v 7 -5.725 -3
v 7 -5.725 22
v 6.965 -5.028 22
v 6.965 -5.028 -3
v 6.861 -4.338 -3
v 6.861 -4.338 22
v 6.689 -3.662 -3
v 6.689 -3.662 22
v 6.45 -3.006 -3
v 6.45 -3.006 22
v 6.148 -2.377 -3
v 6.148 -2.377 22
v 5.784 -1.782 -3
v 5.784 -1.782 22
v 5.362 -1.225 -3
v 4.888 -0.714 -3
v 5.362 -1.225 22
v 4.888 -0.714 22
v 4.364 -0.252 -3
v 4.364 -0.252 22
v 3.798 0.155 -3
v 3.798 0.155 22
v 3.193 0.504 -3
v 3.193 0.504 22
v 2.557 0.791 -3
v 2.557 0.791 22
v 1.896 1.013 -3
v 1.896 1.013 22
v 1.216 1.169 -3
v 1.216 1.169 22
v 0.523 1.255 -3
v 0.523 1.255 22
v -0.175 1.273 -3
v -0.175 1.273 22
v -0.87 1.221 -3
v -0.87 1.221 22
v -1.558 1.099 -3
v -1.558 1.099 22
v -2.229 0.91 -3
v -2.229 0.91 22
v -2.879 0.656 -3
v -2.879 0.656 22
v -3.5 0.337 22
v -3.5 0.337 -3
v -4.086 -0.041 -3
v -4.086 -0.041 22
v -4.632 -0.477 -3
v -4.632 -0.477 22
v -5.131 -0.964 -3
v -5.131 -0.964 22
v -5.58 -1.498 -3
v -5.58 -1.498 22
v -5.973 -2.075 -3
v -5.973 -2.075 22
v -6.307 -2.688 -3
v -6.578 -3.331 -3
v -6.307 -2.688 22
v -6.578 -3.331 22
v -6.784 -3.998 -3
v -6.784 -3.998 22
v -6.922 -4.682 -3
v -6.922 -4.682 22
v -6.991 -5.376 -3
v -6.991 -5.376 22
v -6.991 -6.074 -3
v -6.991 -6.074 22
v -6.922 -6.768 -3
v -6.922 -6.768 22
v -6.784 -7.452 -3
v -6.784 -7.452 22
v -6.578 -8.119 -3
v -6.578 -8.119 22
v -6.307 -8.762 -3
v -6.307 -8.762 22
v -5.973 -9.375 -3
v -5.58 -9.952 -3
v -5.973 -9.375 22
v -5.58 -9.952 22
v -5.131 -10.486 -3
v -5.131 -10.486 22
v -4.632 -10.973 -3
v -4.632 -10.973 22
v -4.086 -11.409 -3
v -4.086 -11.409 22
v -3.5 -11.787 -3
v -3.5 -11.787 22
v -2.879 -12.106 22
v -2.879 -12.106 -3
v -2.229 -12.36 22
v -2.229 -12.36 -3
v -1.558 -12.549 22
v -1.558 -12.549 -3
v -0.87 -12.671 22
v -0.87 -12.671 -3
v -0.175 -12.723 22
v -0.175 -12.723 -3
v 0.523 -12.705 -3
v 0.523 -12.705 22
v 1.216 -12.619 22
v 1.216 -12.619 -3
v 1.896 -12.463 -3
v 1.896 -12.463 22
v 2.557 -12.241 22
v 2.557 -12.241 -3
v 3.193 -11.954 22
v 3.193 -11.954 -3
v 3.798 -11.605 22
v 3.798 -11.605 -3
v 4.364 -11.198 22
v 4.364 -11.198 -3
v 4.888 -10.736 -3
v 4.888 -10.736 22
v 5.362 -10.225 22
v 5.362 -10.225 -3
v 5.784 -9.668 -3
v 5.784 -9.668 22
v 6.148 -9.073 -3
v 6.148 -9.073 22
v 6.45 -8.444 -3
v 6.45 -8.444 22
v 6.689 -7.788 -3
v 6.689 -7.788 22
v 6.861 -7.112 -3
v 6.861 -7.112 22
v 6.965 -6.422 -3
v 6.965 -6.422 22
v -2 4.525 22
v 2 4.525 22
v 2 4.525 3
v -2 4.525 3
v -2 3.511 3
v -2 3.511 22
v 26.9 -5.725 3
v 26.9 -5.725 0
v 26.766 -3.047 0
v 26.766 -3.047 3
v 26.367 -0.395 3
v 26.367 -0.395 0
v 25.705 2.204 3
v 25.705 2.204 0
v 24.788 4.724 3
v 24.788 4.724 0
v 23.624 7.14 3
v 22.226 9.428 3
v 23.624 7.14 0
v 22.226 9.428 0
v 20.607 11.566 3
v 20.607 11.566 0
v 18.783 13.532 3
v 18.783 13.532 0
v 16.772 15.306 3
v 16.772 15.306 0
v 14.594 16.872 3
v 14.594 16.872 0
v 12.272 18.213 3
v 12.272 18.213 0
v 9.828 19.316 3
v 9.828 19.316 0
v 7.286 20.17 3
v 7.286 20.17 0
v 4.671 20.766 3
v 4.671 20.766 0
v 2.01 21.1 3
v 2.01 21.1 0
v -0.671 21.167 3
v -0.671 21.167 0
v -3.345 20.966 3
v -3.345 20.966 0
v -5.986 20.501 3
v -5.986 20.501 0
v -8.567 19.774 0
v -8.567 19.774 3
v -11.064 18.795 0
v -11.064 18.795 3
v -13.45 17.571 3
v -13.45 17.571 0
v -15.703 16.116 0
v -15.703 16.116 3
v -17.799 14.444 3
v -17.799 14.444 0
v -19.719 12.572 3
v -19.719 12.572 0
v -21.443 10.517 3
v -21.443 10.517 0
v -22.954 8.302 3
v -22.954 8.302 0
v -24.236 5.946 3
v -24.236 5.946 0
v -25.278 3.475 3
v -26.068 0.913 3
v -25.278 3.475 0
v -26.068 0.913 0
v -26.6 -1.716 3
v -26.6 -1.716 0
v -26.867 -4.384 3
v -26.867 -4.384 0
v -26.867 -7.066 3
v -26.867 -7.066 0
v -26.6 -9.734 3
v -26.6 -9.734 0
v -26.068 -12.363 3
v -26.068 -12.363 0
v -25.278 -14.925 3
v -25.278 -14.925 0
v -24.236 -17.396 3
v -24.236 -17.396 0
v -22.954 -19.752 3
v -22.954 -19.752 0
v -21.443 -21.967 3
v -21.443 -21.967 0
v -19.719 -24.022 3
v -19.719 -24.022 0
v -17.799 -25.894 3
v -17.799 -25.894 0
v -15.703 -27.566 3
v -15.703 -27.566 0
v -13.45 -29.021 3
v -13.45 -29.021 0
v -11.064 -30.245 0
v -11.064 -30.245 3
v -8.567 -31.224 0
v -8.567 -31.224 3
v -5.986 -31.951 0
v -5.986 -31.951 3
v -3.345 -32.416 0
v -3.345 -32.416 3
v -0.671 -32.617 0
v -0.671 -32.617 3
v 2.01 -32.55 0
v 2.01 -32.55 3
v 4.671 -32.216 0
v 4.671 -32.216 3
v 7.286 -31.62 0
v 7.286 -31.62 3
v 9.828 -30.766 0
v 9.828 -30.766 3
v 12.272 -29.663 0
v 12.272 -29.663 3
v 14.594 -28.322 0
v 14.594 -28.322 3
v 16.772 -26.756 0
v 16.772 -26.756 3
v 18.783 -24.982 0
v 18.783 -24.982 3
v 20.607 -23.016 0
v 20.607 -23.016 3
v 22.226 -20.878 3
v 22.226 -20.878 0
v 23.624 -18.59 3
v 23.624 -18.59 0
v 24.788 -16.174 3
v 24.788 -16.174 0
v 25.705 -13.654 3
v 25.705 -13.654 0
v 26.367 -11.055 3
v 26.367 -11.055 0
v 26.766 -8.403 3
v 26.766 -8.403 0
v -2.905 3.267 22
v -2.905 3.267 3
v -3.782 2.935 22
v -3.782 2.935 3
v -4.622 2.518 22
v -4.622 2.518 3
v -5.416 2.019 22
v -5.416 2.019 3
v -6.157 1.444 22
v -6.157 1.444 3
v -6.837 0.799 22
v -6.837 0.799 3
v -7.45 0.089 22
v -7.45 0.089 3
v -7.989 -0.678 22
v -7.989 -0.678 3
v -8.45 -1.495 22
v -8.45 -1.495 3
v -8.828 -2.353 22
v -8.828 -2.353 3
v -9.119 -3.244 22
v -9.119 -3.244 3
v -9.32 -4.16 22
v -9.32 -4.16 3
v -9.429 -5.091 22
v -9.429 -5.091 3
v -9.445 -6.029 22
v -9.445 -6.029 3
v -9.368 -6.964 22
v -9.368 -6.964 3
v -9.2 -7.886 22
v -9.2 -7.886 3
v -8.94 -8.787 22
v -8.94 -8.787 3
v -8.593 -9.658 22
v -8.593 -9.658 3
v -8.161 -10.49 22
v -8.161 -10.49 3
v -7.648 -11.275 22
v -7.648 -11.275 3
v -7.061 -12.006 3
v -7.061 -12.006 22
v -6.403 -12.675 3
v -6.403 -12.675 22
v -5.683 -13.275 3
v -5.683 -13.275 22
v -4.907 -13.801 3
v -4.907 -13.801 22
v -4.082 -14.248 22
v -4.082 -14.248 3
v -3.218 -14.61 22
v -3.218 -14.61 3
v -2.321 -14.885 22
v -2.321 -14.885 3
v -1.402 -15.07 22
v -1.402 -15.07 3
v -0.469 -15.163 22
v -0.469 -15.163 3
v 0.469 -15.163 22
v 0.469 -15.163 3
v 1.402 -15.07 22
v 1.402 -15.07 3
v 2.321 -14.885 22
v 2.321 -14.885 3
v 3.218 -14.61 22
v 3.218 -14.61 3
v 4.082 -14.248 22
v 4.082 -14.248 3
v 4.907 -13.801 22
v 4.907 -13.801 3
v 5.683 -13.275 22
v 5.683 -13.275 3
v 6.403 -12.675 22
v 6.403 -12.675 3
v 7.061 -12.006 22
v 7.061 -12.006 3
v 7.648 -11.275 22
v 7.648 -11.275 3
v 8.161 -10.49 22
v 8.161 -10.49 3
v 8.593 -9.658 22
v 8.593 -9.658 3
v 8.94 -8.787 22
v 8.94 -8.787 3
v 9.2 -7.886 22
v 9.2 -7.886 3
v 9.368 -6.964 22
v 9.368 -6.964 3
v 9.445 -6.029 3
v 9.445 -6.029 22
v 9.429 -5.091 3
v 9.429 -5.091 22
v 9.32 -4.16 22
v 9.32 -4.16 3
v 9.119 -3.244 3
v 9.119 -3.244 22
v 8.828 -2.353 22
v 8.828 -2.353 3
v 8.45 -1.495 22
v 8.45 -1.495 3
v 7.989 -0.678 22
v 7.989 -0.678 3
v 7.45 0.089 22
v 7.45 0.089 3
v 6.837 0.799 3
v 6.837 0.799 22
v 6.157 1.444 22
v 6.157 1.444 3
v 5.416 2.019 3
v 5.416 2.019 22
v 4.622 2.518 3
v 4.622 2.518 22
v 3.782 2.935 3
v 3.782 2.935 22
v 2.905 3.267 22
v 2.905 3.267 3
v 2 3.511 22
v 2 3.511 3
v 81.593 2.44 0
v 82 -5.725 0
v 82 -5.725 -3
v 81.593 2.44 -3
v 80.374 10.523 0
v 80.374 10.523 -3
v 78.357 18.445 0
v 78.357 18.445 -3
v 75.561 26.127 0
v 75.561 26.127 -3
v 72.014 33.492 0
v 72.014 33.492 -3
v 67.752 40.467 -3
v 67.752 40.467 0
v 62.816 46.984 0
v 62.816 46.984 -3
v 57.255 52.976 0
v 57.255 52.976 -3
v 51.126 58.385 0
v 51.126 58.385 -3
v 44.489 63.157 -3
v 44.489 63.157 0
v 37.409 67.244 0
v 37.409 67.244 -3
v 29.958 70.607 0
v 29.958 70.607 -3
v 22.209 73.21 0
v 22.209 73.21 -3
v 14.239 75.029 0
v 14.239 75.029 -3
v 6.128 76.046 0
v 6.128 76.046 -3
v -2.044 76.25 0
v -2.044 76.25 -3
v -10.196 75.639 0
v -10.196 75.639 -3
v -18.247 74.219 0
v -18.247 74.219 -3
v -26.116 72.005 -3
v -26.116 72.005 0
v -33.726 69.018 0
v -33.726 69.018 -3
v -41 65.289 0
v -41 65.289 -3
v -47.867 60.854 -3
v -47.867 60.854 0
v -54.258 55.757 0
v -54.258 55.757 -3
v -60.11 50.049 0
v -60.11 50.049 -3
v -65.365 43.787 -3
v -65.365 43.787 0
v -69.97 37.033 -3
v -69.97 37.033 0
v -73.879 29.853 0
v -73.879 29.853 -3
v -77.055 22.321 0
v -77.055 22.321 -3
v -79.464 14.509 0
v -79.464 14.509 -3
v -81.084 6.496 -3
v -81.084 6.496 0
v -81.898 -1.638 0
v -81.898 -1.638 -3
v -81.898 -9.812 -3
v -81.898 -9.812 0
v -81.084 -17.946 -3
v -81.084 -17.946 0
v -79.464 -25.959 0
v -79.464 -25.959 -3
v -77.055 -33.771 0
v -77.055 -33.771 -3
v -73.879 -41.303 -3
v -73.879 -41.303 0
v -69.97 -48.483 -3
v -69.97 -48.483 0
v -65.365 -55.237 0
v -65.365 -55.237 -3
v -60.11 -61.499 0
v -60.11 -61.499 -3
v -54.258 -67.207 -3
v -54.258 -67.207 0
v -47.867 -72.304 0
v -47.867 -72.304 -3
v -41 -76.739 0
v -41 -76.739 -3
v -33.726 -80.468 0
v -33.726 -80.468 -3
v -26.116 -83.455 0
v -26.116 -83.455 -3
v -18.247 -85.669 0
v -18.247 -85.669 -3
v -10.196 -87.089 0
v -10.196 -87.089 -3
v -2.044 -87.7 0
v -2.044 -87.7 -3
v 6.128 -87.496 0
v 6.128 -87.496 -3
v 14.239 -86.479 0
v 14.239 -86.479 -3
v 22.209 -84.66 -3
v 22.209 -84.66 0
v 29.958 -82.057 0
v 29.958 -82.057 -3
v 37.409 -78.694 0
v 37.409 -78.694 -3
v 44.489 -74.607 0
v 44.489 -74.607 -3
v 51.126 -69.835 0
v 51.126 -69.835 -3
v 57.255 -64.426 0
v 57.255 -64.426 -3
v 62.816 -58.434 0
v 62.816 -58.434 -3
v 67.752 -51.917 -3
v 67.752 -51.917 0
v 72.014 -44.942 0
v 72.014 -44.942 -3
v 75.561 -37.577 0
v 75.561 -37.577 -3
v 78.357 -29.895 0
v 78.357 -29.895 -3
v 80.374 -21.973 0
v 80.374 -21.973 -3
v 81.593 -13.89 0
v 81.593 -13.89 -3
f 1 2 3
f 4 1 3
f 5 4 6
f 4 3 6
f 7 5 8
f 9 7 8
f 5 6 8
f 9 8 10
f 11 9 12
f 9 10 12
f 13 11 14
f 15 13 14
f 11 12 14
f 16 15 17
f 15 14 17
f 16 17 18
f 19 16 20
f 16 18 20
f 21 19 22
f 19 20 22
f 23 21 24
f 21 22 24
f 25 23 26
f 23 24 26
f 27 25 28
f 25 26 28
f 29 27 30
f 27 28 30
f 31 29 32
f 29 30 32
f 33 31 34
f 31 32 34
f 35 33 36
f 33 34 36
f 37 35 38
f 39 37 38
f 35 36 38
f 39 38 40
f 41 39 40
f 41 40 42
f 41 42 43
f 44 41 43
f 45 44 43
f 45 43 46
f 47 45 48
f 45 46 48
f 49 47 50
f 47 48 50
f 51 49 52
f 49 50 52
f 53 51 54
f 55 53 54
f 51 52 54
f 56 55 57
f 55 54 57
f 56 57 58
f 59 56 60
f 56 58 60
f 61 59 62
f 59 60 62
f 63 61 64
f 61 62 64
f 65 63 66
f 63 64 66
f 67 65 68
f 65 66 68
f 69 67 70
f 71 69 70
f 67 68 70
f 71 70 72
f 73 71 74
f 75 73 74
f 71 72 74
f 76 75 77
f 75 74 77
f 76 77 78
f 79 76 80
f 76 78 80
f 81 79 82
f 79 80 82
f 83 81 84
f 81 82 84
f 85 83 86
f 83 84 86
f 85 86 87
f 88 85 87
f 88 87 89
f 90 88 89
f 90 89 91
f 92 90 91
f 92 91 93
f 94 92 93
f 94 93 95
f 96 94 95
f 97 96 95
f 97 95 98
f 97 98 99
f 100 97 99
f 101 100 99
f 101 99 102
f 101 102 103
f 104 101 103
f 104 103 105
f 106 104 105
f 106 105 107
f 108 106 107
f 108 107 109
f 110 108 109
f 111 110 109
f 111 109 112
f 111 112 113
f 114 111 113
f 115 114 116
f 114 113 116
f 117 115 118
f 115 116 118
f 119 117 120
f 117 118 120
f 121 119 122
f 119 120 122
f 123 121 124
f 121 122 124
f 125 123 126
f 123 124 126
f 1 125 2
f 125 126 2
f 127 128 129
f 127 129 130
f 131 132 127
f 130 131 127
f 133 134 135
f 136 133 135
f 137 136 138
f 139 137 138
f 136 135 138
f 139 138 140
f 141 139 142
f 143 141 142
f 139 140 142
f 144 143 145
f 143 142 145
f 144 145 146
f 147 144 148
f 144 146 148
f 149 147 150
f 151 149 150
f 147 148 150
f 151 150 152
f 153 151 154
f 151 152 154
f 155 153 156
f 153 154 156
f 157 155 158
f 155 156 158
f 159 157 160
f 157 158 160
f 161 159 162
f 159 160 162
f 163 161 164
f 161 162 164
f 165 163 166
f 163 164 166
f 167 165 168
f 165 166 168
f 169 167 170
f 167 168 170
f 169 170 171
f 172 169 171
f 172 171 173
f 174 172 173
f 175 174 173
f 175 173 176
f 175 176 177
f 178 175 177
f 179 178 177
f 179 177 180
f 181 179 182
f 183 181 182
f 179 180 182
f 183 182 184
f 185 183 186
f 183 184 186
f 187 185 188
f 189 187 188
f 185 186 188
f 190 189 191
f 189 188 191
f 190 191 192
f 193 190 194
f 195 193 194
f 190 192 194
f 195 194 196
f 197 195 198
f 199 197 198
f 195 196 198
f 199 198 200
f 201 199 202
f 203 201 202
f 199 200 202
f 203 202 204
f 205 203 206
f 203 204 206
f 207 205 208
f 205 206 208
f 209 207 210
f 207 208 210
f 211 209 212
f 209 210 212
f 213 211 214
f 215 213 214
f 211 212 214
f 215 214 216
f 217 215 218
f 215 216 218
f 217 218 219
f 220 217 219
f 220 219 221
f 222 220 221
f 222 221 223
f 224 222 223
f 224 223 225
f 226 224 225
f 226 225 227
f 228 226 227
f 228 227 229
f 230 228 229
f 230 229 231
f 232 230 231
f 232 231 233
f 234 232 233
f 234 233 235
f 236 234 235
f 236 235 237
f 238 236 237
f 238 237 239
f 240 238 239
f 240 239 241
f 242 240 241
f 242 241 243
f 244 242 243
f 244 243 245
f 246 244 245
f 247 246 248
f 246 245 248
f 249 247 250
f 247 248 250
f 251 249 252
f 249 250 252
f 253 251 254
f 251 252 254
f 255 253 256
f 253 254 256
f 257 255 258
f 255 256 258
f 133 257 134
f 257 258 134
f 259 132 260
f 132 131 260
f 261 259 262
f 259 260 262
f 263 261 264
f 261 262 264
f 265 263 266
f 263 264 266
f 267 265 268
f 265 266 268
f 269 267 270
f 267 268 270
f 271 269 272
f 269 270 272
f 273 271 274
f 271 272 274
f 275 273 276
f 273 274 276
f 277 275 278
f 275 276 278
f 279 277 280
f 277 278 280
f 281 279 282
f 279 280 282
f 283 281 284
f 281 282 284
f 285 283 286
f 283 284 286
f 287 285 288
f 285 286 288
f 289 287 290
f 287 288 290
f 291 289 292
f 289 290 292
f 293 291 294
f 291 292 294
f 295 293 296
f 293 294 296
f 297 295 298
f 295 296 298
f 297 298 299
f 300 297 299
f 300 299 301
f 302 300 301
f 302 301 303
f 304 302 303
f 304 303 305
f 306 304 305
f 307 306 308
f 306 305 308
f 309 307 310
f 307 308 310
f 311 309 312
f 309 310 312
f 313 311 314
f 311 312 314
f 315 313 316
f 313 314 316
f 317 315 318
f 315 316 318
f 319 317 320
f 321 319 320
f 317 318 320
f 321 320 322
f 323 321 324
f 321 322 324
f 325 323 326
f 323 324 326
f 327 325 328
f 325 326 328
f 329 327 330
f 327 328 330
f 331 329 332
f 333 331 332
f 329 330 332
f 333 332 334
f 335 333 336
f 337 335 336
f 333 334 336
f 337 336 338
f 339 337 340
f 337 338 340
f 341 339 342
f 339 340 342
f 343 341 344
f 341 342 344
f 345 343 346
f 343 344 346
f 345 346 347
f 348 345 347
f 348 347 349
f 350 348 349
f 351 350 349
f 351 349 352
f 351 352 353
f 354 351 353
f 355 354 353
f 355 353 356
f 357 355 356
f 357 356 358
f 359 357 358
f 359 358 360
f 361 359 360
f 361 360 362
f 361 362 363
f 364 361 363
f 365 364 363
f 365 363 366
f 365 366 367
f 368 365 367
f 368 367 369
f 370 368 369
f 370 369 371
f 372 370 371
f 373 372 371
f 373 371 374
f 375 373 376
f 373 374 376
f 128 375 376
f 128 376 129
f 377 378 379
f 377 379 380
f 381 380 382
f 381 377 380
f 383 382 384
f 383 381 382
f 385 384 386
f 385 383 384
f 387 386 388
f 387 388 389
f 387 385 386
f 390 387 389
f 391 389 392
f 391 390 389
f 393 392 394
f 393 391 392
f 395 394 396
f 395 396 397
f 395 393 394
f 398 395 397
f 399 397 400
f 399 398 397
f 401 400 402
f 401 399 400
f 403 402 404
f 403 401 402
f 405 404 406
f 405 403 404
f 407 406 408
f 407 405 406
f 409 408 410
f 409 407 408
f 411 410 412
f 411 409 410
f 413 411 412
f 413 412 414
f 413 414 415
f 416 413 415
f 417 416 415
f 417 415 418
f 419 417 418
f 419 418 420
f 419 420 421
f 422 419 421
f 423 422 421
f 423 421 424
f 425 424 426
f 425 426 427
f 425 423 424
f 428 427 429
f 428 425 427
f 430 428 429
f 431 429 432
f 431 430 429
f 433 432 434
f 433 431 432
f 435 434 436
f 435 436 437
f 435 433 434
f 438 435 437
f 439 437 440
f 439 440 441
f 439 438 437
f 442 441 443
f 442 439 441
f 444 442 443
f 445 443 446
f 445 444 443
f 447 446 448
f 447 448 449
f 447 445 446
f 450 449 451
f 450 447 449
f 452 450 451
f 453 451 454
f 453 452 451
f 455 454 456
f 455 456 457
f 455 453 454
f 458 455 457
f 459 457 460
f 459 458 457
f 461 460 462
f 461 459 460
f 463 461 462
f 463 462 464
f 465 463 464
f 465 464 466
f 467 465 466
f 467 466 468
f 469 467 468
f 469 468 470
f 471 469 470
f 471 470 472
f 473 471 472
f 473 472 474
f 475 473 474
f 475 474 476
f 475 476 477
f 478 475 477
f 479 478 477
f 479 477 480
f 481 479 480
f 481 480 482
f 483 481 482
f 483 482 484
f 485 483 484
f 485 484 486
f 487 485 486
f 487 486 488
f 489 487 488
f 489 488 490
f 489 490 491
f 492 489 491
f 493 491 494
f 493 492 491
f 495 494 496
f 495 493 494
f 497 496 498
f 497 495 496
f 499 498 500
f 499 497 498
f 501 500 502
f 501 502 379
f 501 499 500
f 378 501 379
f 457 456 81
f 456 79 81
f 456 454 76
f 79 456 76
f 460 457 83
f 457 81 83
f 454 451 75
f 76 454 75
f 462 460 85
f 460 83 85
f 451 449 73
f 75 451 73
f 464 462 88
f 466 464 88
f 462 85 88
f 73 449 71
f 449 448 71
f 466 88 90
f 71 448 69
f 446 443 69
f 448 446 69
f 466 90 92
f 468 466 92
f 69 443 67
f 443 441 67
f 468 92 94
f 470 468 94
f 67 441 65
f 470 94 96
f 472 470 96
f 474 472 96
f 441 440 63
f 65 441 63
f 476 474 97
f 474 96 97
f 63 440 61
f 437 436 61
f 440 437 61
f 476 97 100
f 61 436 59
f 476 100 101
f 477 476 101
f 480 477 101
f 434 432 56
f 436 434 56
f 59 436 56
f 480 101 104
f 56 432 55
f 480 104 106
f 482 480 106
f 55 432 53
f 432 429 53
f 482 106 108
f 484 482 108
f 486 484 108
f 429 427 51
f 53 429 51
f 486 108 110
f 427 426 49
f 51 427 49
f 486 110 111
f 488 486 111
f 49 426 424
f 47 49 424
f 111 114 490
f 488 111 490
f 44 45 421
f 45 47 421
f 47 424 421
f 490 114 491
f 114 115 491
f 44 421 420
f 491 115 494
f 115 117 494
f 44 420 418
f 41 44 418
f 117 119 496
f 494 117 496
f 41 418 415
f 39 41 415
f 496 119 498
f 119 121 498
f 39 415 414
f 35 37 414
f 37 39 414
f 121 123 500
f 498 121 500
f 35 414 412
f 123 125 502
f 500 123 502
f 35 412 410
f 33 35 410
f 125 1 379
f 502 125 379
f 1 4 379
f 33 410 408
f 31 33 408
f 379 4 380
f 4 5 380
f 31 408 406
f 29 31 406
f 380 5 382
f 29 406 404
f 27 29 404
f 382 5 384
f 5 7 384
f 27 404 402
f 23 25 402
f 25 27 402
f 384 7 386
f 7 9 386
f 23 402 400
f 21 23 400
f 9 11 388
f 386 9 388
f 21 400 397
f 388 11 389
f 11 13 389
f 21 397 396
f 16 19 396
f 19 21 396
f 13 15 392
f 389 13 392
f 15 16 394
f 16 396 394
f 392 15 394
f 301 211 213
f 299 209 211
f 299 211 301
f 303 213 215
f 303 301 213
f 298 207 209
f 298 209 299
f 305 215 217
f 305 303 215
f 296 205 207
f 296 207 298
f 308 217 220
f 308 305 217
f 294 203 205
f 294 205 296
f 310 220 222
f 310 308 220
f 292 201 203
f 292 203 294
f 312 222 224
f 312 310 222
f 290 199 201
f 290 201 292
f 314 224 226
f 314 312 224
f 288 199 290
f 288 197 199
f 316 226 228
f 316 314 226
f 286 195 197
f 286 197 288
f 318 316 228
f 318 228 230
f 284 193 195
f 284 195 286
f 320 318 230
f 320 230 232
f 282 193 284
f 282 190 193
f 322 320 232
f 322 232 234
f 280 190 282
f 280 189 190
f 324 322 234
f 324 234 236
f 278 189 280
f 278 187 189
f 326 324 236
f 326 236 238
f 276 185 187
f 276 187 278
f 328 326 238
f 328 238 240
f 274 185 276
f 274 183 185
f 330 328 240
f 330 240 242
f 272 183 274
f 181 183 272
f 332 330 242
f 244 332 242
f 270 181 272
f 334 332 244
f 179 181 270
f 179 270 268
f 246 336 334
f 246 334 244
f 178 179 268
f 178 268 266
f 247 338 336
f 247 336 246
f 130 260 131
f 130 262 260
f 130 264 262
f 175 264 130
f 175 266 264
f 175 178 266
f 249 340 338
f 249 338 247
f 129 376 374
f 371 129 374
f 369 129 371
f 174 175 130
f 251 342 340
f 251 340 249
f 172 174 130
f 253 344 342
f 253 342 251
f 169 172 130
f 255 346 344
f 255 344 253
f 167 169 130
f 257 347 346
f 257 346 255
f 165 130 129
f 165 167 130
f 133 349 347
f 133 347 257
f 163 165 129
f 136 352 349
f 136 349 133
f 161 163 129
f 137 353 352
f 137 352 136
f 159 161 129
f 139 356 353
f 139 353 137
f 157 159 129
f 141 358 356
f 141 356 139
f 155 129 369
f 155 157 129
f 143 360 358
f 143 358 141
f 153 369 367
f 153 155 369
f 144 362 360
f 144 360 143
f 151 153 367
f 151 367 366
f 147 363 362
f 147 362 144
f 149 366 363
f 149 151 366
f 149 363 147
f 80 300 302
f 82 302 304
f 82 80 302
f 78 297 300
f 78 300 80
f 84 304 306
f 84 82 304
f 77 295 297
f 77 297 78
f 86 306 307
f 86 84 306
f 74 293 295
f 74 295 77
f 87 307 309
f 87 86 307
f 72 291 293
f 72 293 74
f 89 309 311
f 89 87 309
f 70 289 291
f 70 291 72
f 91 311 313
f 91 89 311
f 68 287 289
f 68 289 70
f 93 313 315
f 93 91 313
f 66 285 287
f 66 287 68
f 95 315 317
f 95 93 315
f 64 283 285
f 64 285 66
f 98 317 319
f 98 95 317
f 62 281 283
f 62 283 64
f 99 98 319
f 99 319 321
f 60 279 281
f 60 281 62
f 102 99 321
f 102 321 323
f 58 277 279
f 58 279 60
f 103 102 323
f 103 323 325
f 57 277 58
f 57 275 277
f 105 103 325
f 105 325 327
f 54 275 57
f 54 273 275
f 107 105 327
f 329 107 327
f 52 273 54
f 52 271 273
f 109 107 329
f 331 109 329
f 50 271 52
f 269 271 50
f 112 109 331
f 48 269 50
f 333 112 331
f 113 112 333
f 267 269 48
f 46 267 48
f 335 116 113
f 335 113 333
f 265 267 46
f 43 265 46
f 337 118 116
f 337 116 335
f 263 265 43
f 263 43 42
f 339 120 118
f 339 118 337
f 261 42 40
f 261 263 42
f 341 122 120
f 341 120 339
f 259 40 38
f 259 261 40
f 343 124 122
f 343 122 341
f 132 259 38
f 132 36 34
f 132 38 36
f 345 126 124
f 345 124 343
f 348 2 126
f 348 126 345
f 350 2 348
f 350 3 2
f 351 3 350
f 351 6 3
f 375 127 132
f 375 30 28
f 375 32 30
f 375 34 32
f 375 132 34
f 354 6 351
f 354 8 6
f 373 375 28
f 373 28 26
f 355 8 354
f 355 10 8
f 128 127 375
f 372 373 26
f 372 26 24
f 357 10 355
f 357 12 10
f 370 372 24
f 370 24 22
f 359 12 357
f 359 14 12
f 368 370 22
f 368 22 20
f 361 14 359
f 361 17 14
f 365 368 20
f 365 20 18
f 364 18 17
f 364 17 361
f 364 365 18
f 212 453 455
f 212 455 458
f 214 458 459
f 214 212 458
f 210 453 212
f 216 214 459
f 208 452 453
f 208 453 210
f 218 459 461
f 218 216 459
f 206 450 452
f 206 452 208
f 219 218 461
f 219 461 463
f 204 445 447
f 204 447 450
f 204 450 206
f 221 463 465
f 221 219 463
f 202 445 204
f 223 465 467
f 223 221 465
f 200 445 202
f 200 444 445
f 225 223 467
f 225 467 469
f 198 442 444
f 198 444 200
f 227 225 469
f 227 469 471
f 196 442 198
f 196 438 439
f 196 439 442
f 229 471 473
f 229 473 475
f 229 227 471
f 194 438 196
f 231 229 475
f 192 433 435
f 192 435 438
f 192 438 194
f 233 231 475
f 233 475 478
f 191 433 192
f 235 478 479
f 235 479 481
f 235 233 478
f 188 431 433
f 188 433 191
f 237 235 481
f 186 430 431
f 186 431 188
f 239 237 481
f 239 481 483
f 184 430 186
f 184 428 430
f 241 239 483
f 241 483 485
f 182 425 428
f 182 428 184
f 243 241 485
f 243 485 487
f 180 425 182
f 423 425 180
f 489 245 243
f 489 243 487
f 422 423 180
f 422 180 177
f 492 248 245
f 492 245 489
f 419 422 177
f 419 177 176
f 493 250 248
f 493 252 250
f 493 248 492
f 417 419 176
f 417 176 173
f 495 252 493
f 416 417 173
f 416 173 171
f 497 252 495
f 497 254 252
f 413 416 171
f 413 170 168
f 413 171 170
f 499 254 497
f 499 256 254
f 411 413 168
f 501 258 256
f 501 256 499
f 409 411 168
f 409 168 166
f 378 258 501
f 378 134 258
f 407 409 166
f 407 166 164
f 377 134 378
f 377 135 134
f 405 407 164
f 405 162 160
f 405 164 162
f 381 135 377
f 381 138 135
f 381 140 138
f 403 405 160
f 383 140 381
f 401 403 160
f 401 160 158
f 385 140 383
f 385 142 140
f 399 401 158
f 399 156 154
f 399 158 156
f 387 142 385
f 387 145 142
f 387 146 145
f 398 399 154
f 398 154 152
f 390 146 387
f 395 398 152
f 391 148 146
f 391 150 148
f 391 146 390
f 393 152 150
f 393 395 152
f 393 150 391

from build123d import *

# Parameters (mm, degrees)
F0_R      = 82
F1_DEPTH  = 3
F2_R      = 26.9
F3_DEPTH  = 3
F4_R      = 9.45
F5_DEPTH  = 19
F6_W      = 4
F6_H      = 11.45
F7_DEPTH  = 19
F9_DEPTH  = 20
F9_FACE_W = 4
F9_FACE_H = 19
F10_DEPTH = 1.2
F11_R     = 7
F12_DEPTH = 25


with BuildPart() as f1:
    # F0 (on Top) → F1 (new body)
    with BuildSketch(Plane.XY):
        Circle(F0_R)
    extrude(amount=-F1_DEPTH)

    # F2 (on face) → F3 (join)
    with BuildSketch(Plane.XY):
        Circle(F2_R)
    extrude(amount=F3_DEPTH)

    # F4 (on face) → F5 (join)
    with BuildSketch(Plane.XY.offset(3)):
        Circle(F4_R)
    extrude(amount=F5_DEPTH)

    # F6 (on face) → F7 (join)
    with BuildSketch(Plane.XY.offset(22)):
        Rectangle(F6_W, F6_H)
    extrude(amount=-F7_DEPTH)


with BuildPart() as f1_1:
    # F8: moved
    add(f1.part.moved(Location((0, -5.725, 0))))

    # F6 (on face) → F9 (join)
    with BuildSketch(Plane.XY.offset(22)):
        Rectangle(F6_W, F6_H)
    extrude(amount=-F9_DEPTH)

    # F9_face (on face) → F10 (cut)
    with BuildSketch(Plane(origin=(0, 5.725, 12.5), x_dir=(-1, 0, 0), z_dir=(0, 1, 0))):
        Rectangle(F9_FACE_W, F9_FACE_H)
    extrude(amount=-F10_DEPTH, mode=Mode.SUBTRACT)

    # F11 (on face) → F12 (cut)
    with BuildSketch(Plane.XY.offset(22)):
        with Locations((0, -5.725)):
            Circle(F11_R)
    extrude(amount=-F12_DEPTH, mode=Mode.SUBTRACT)


solid = f1_1.part
